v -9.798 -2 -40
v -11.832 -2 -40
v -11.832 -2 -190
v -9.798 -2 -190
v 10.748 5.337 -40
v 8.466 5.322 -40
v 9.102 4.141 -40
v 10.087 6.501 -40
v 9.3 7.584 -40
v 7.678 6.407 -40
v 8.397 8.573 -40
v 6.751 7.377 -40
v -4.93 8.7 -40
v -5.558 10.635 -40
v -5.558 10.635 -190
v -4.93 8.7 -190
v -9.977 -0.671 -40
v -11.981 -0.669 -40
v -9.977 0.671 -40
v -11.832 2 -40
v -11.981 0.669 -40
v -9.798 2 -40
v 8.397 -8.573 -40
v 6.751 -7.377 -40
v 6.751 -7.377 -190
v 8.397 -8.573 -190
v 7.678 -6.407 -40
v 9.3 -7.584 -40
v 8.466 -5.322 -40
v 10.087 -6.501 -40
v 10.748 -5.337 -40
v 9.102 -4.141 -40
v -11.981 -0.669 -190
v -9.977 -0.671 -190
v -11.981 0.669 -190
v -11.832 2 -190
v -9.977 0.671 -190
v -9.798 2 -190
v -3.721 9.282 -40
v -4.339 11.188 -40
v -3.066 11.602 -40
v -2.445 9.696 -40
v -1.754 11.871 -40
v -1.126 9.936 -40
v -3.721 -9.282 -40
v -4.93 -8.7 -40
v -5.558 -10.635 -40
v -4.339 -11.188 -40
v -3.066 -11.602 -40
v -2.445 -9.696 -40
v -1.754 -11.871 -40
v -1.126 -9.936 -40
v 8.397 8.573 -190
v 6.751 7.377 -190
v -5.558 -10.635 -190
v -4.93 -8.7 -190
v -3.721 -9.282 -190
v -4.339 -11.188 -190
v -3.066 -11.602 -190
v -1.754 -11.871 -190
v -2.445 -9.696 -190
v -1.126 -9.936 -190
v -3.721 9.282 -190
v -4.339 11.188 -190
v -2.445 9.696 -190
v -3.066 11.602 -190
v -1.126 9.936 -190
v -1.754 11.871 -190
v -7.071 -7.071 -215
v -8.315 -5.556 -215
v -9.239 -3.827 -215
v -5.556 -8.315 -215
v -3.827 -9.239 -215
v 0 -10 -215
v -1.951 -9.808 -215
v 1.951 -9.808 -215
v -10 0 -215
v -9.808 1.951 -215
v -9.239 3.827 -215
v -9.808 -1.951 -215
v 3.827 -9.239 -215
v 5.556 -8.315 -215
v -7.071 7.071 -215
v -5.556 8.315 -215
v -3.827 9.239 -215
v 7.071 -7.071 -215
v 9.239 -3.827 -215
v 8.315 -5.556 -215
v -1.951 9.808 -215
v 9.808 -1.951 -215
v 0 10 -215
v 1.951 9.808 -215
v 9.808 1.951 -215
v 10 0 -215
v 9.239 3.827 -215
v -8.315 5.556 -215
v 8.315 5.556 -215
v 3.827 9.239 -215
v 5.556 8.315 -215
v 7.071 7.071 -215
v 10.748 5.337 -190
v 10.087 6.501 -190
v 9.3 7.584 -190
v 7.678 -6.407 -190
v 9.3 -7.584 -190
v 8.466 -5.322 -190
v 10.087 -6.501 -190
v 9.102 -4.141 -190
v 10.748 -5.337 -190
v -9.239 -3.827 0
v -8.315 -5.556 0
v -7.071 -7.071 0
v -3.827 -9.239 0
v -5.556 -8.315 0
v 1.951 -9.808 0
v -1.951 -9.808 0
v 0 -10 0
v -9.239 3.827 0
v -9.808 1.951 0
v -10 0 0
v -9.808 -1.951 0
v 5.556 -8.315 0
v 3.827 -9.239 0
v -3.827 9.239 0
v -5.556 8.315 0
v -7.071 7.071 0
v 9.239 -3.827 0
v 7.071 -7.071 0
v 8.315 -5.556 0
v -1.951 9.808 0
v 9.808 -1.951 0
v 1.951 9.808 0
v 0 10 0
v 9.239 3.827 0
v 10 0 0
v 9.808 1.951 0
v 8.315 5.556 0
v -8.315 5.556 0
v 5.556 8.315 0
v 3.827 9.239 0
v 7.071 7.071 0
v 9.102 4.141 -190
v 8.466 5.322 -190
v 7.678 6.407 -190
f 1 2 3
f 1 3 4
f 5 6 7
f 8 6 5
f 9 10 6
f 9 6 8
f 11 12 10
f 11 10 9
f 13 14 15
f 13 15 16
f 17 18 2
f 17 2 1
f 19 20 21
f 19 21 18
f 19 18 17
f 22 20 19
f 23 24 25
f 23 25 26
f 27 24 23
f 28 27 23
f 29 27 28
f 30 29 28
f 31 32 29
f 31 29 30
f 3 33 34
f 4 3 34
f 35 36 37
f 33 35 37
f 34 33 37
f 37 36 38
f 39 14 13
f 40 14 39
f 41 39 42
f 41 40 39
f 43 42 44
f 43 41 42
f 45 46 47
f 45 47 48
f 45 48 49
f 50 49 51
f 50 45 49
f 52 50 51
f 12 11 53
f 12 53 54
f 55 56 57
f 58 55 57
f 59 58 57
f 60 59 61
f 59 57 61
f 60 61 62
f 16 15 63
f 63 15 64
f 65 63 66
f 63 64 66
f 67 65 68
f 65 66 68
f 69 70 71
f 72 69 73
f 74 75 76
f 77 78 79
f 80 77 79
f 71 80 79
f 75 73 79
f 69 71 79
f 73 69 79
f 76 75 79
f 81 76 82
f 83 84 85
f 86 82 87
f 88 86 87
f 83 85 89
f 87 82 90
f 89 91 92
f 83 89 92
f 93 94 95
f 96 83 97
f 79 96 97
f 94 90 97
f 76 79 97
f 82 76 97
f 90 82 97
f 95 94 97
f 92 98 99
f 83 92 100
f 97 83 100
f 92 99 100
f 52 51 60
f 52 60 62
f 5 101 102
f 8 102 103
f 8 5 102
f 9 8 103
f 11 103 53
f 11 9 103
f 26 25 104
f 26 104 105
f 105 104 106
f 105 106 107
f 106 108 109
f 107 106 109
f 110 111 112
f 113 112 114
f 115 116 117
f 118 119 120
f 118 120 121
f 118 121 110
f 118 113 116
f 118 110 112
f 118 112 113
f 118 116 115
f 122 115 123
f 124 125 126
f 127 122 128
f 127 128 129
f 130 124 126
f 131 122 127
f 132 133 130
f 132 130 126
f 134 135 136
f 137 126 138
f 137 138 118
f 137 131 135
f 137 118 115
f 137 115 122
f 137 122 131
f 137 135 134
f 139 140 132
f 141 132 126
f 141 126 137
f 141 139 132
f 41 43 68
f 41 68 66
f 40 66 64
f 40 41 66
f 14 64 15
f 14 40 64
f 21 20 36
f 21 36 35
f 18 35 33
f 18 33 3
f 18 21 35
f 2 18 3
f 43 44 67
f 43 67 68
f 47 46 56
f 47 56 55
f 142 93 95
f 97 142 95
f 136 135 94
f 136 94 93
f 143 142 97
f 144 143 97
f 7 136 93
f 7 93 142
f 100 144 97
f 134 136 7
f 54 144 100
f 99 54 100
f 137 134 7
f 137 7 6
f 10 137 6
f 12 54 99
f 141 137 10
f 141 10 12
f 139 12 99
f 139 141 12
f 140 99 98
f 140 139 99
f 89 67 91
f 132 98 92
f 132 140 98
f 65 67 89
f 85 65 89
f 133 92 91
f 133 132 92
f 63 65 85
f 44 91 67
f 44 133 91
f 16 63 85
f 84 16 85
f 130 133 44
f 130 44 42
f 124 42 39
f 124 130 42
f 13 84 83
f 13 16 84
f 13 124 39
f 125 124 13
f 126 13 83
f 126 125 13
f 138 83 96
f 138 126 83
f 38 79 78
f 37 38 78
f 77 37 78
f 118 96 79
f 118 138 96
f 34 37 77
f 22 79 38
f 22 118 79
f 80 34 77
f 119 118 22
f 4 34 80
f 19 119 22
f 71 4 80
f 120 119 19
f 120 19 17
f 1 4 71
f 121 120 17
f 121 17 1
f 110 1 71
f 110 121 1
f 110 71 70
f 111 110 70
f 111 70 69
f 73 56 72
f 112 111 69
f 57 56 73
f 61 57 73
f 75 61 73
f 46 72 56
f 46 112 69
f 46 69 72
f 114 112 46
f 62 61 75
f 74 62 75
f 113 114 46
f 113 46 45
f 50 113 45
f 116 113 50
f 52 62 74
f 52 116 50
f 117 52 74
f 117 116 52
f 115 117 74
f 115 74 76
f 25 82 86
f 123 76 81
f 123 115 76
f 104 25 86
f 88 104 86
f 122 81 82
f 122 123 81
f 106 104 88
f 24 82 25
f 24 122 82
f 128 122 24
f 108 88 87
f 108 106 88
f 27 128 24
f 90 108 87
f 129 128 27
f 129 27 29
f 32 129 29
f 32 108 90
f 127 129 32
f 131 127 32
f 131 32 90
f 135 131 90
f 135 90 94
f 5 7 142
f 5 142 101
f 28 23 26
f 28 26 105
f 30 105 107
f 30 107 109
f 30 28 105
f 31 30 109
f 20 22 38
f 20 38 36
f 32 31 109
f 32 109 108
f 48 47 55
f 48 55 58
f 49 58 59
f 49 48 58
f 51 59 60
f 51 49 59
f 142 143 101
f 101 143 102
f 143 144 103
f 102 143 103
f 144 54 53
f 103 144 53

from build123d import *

# Parameters (mm, degrees)
IZIM1_R                     = 10
Y_KSEKLIK_EKSTR_ZYON1_DEPTH = 215
Y_KSEKLIK_EKSTR_ZYON2_DEPTH = 150


with BuildPart() as part:
    # Çizim1 → Yükseklik-Ekstrüzyon1 (new body)
    with BuildSketch(Plane.XY):
        Circle(IZIM1_R)
    extrude(amount=-Y_KSEKLIK_EKSTR_ZYON1_DEPTH)

    # Çizim2 → Yükseklik-Ekstrüzyon2 (add)
    with BuildSketch(Plane.XY.offset(-40)):
        with BuildLine():
            ThreePointArc((-9.797958971, -2), (-10, 0), (-9.797958971, 2))
            Line((-9.797958971, 2), (-11.832159566, 2))
            ThreePointArc((-11.832159566, 2), (-12, 0), (-11.832159566, -2))
            Line((-11.832159566, -2), (-9.797958971, -2))
        make_face()
        with BuildLine():
            Line((-1.1256228, 9.936446715), (-1.754225354, 11.871086446))
            ThreePointArc((-1.754225354, 11.871086446), (-3.708203932, 11.412678196), (-5.558451419, 10.635018469))
            Line((-5.558451419, 10.635018469), (-4.929848865, 8.700378737))
            ThreePointArc((-4.929848865, 8.700378737), (-3.090169944, 9.510565163), (-1.1256228, 9.936446715))
        make_face()
        with BuildLine():
            Line((8.396847665, 8.572802885), (6.751144813, 7.377129775))
            ThreePointArc((6.751144813, 7.377129775), (8.090169944, 5.877852523), (9.102285822, 4.141061797))
            Line((9.102285822, 4.141061797), (10.747988674, 5.336734907))
            ThreePointArc((10.747988674, 5.336734907), (9.708203932, 7.053423028), (8.396847665, 8.572802885))
        make_face()
        with BuildLine():
            Line((10.747988674, -5.336734907), (9.102285822, -4.141061797))
            ThreePointArc((9.102285822, -4.141061797), (8.090169944, -5.877852523), (6.751144813, -7.377129775))
            Line((6.751144813, -7.377129775), (8.396847665, -8.572802885))
            ThreePointArc((8.396847665, -8.572802885), (9.708203932, -7.053423028), (10.747988674, -5.336734907))
        make_face()
        with BuildLine():
            ThreePointArc((-1.1256228, -9.936446715), (-3.090169944, -9.510565163), (-4.929848865, -8.700378737))
            Line((-4.929848865, -8.700378737), (-5.558451419, -10.635018469))
            ThreePointArc((-5.558451419, -10.635018469), (-3.708203932, -11.412678196), (-1.754225354, -11.871086446))
            Line((-1.754225354, -11.871086446), (-1.1256228, -9.936446715))
        make_face()
    extrude(amount=-Y_KSEKLIK_EKSTR_ZYON2_DEPTH)


solid = part.part
